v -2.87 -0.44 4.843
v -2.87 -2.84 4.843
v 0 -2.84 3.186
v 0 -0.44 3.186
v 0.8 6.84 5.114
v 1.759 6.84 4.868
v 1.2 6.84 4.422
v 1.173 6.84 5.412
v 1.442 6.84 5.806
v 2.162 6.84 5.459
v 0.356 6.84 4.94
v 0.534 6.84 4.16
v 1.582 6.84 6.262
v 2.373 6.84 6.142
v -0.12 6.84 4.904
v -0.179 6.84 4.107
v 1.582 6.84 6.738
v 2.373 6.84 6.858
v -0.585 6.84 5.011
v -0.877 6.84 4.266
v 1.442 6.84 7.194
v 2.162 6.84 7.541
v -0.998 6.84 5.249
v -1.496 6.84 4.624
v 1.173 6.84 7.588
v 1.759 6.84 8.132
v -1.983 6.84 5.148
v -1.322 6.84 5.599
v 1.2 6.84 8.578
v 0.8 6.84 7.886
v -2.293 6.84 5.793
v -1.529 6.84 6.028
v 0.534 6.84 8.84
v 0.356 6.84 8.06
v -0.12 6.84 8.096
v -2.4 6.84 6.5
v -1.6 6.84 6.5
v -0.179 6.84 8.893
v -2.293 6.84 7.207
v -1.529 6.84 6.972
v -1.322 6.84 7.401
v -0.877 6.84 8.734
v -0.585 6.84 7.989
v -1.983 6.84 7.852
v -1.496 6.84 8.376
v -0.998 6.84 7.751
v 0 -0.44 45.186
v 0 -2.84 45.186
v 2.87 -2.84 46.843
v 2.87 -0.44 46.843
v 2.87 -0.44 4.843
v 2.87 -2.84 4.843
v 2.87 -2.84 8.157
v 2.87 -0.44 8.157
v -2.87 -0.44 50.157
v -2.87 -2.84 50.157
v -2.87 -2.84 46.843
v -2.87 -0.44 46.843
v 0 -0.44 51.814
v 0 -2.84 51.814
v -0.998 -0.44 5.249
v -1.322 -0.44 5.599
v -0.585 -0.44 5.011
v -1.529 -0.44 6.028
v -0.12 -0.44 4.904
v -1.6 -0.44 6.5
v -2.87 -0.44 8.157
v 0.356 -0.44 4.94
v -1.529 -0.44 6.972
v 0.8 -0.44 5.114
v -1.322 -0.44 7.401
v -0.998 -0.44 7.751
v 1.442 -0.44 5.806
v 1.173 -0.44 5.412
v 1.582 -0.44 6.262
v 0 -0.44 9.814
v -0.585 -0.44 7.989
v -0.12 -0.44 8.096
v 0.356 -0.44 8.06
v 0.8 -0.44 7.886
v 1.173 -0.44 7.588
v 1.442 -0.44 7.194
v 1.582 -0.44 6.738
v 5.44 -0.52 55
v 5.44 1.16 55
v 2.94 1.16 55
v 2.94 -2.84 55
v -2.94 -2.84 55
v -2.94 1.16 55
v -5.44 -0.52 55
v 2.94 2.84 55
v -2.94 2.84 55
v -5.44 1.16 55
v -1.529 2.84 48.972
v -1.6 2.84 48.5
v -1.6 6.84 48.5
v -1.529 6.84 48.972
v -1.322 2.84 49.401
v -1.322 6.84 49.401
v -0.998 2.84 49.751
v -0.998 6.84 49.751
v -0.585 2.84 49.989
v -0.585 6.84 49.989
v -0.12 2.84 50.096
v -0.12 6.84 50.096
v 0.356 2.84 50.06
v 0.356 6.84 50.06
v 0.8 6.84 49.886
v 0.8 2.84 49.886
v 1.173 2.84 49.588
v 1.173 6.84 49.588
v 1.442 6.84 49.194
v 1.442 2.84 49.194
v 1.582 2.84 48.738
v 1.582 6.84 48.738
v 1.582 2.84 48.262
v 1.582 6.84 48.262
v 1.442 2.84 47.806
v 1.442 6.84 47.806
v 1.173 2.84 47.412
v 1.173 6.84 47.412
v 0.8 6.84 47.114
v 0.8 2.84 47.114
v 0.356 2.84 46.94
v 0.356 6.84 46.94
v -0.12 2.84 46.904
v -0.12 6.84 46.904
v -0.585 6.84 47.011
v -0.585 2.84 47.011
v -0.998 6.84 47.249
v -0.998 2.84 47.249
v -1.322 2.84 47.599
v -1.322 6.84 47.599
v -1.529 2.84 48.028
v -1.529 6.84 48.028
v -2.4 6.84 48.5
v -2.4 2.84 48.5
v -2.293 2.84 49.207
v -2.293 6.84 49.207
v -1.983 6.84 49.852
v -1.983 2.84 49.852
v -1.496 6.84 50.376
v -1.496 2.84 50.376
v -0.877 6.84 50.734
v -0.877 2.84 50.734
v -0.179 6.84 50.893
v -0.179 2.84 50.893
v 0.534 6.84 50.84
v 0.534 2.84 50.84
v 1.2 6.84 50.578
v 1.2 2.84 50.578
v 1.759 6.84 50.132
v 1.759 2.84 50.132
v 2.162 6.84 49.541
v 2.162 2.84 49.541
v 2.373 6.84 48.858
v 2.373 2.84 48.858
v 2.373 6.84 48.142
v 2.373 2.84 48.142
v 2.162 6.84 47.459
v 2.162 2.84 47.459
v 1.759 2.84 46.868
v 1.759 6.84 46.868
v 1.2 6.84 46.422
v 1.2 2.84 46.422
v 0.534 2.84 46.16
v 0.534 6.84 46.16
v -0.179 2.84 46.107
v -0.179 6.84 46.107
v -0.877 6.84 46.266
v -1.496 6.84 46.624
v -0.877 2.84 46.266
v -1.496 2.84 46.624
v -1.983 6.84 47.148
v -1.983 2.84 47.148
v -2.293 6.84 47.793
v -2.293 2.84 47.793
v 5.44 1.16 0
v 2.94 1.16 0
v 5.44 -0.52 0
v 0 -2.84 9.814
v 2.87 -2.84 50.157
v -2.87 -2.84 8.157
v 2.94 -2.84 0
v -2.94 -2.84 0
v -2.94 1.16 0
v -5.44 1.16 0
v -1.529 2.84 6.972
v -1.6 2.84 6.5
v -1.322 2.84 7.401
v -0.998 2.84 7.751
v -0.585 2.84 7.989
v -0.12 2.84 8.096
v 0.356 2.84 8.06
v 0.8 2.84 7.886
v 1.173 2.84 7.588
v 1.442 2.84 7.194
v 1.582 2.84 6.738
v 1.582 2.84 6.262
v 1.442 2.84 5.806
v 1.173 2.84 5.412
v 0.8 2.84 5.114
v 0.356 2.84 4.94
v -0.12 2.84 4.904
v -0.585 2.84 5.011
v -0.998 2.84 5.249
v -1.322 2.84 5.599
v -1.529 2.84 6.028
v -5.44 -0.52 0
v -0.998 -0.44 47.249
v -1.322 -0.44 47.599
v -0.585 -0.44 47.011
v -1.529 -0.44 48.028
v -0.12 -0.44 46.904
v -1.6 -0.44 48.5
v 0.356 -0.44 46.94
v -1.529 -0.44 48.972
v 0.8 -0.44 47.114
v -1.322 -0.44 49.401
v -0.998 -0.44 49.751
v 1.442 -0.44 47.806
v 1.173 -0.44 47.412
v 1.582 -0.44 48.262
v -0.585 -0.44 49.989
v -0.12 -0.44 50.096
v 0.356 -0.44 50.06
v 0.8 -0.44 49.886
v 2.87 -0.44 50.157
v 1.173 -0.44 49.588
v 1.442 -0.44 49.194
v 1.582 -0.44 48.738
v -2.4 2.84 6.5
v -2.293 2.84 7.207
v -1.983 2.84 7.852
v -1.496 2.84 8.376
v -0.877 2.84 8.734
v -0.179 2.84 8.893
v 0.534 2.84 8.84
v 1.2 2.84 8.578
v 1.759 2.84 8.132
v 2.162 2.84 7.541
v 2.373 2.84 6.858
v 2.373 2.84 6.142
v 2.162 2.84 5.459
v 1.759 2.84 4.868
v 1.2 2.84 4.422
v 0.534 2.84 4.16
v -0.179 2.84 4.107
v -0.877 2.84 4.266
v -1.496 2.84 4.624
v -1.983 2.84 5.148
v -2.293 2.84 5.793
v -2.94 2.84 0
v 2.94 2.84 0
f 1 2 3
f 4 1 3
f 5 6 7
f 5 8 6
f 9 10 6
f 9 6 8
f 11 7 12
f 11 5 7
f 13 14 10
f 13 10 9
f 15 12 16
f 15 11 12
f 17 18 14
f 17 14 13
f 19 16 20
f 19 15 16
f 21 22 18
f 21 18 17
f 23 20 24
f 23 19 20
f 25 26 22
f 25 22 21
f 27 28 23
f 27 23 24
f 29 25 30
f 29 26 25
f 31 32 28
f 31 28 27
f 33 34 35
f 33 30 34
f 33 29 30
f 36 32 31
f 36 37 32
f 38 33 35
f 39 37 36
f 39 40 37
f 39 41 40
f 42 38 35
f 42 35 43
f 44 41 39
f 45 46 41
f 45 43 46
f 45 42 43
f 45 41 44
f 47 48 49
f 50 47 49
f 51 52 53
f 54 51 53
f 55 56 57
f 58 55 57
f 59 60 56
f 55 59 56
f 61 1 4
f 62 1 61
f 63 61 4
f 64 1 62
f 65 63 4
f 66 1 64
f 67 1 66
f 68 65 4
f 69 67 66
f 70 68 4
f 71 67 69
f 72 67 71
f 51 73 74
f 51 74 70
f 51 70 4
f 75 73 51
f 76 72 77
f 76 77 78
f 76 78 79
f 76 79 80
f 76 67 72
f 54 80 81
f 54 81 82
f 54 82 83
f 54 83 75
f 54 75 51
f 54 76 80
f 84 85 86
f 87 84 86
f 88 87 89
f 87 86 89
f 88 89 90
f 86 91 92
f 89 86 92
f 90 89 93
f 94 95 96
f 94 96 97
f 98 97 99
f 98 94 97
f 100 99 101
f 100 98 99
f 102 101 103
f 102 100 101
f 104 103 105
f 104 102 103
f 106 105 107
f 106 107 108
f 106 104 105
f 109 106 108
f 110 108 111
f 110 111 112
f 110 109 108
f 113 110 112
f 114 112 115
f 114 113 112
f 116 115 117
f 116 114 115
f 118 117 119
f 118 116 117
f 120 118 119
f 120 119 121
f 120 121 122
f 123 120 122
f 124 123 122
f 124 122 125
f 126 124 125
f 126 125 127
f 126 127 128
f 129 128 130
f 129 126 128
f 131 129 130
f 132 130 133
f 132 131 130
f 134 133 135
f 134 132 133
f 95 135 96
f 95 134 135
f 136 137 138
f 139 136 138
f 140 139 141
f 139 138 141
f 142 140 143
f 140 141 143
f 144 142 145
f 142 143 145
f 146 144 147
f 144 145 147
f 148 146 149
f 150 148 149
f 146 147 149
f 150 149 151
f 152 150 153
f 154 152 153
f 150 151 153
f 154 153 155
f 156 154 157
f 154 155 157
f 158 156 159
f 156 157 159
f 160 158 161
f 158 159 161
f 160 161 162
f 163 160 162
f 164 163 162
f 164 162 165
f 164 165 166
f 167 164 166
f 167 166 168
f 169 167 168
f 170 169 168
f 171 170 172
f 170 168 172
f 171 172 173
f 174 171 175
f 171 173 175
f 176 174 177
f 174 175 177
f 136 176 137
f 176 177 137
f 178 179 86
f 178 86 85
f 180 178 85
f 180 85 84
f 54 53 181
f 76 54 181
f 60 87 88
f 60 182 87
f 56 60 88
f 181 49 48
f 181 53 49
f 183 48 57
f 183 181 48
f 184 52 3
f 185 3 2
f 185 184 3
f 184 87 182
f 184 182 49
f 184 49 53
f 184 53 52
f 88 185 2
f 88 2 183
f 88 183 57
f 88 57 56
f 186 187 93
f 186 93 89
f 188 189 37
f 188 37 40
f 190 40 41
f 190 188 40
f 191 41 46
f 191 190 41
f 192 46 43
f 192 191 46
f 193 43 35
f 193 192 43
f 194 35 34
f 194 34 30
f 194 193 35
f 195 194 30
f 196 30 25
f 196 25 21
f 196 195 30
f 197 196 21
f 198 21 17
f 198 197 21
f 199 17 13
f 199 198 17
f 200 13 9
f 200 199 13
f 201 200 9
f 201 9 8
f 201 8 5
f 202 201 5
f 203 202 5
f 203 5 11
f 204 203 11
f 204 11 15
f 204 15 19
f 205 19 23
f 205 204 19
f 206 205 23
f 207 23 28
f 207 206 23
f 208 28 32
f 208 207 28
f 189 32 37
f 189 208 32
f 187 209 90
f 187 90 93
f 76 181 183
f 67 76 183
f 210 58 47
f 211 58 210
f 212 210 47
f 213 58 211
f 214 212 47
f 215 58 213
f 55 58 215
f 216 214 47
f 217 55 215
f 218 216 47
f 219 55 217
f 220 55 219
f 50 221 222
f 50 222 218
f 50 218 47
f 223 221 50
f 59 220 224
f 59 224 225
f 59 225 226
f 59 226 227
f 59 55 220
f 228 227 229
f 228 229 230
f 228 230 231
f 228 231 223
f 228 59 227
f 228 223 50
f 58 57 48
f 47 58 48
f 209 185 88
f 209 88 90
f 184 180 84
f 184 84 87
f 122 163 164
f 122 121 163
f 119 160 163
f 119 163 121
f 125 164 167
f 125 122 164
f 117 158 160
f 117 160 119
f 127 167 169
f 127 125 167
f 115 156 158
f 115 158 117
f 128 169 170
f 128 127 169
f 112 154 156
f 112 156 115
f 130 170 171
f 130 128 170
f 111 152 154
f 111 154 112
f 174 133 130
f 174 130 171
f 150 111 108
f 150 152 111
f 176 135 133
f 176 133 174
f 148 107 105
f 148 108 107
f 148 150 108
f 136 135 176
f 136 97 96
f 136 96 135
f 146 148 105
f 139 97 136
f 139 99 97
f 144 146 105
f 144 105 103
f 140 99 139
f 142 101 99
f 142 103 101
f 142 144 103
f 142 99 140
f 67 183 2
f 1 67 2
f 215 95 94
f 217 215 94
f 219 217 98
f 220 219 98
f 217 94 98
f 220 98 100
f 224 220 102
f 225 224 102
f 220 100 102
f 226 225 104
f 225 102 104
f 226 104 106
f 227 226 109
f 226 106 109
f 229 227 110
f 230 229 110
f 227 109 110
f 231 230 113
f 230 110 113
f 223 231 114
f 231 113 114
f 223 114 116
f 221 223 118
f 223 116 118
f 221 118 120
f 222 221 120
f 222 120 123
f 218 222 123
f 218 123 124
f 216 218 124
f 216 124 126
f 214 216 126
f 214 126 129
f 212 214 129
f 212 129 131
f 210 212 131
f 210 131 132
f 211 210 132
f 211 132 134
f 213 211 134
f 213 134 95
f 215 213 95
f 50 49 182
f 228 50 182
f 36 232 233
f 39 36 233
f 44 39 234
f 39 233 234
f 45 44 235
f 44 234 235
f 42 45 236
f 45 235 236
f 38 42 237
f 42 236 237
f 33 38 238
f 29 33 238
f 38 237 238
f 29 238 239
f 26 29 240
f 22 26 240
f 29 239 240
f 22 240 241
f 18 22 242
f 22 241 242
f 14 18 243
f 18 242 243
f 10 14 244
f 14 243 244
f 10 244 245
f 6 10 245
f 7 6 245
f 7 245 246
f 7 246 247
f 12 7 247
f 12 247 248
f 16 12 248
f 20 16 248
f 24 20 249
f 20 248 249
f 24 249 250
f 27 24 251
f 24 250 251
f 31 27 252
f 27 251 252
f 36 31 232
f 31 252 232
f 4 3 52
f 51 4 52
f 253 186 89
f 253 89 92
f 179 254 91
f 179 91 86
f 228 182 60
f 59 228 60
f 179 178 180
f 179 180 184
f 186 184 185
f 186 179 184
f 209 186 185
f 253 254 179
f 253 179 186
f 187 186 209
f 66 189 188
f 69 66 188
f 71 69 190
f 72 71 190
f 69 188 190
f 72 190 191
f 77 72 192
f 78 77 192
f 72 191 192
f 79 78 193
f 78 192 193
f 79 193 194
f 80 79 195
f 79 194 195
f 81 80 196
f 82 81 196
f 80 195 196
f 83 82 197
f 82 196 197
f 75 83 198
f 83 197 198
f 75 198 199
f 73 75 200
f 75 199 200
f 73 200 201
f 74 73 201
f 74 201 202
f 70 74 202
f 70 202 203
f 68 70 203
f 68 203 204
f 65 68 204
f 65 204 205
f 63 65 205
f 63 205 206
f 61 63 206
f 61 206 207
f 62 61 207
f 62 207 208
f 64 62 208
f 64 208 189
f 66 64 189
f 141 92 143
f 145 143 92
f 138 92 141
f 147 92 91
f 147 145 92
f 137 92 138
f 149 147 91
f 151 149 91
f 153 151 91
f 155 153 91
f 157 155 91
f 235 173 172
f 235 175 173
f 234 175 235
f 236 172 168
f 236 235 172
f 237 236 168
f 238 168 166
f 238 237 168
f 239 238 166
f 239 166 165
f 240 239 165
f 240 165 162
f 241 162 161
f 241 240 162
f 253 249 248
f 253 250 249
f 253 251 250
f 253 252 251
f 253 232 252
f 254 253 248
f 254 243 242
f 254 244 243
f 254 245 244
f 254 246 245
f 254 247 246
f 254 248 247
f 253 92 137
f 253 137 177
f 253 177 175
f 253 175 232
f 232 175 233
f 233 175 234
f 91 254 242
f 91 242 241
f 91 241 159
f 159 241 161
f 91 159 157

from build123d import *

# Parameters (mm, degrees)
PAD_DEPTH       = 55
SKETCH001_R     = 1.6
POCKET_DEPTH    = 5.68
POCKET001_DEPTH = 2.4
SKETCH003_R     = 2.4
SKETCH003_R_2   = 1.6
PAD001_DEPTH    = 4


with BuildPart() as part:
    # Sketch → Pad (new body)
    with BuildSketch(Plane.XY):
        Polygon((2.94, -2.84), (-2.94, -2.84), (-5.44, -0.52), (-5.44, 1.16), (-2.94, 1.16), (-2.94, 2.84), (2.94, 2.84), (2.94, 1.16), (5.44, 1.16), (5.44, -0.52), align=None)
    extrude(amount=PAD_DEPTH)

    # Sketch001 (on Face6 of Pad) → Pocket (cut)
    with BuildSketch(Plane(origin=(0, 2.84, 0), x_dir=(-1, 0, 0), z_dir=(0, 1, 0))):
        with Locations((0, 48.5)):
            Circle(SKETCH001_R)
        with Locations((0, 6.5)):
            Circle(SKETCH001_R)
    extrude(amount=-POCKET_DEPTH, mode=Mode.SUBTRACT)

    # Sketch002 (on Face1 of Pocket) → Pocket001 (cut)
    with BuildSketch(Plane.XZ.offset(2.84)):
        Polygon((0, 45.186009), (2.87, 46.843005), (2.87, 50.156995), (0, 51.813991), (-2.87, 50.156995), (-2.87, 46.843005), align=None)
        Polygon((0, 3.186009), (2.87, 4.843005), (2.87, 8.156995), (0, 9.813991), (-2.87, 8.156995), (-2.87, 4.843005), align=None)
    extrude(amount=-POCKET001_DEPTH, mode=Mode.SUBTRACT)

    # Sketch003 (on Face22 of Pocket001) → Pad001 (join)
    with BuildSketch(Plane(origin=(0, 2.84, 0), x_dir=(-1, 0, 0), z_dir=(0, 1, 0))):
        with Locations((0, 6.5)):
            Circle(SKETCH003_R)
        with Locations((0, 6.5)):
            Circle(SKETCH003_R_2, mode=Mode.SUBTRACT)
        with Locations((0, 48.5)):
            Circle(SKETCH003_R)
        with Locations((0, 48.5)):
            Circle(SKETCH003_R_2, mode=Mode.SUBTRACT)
    extrude(amount=PAD001_DEPTH)


solid = part.part
